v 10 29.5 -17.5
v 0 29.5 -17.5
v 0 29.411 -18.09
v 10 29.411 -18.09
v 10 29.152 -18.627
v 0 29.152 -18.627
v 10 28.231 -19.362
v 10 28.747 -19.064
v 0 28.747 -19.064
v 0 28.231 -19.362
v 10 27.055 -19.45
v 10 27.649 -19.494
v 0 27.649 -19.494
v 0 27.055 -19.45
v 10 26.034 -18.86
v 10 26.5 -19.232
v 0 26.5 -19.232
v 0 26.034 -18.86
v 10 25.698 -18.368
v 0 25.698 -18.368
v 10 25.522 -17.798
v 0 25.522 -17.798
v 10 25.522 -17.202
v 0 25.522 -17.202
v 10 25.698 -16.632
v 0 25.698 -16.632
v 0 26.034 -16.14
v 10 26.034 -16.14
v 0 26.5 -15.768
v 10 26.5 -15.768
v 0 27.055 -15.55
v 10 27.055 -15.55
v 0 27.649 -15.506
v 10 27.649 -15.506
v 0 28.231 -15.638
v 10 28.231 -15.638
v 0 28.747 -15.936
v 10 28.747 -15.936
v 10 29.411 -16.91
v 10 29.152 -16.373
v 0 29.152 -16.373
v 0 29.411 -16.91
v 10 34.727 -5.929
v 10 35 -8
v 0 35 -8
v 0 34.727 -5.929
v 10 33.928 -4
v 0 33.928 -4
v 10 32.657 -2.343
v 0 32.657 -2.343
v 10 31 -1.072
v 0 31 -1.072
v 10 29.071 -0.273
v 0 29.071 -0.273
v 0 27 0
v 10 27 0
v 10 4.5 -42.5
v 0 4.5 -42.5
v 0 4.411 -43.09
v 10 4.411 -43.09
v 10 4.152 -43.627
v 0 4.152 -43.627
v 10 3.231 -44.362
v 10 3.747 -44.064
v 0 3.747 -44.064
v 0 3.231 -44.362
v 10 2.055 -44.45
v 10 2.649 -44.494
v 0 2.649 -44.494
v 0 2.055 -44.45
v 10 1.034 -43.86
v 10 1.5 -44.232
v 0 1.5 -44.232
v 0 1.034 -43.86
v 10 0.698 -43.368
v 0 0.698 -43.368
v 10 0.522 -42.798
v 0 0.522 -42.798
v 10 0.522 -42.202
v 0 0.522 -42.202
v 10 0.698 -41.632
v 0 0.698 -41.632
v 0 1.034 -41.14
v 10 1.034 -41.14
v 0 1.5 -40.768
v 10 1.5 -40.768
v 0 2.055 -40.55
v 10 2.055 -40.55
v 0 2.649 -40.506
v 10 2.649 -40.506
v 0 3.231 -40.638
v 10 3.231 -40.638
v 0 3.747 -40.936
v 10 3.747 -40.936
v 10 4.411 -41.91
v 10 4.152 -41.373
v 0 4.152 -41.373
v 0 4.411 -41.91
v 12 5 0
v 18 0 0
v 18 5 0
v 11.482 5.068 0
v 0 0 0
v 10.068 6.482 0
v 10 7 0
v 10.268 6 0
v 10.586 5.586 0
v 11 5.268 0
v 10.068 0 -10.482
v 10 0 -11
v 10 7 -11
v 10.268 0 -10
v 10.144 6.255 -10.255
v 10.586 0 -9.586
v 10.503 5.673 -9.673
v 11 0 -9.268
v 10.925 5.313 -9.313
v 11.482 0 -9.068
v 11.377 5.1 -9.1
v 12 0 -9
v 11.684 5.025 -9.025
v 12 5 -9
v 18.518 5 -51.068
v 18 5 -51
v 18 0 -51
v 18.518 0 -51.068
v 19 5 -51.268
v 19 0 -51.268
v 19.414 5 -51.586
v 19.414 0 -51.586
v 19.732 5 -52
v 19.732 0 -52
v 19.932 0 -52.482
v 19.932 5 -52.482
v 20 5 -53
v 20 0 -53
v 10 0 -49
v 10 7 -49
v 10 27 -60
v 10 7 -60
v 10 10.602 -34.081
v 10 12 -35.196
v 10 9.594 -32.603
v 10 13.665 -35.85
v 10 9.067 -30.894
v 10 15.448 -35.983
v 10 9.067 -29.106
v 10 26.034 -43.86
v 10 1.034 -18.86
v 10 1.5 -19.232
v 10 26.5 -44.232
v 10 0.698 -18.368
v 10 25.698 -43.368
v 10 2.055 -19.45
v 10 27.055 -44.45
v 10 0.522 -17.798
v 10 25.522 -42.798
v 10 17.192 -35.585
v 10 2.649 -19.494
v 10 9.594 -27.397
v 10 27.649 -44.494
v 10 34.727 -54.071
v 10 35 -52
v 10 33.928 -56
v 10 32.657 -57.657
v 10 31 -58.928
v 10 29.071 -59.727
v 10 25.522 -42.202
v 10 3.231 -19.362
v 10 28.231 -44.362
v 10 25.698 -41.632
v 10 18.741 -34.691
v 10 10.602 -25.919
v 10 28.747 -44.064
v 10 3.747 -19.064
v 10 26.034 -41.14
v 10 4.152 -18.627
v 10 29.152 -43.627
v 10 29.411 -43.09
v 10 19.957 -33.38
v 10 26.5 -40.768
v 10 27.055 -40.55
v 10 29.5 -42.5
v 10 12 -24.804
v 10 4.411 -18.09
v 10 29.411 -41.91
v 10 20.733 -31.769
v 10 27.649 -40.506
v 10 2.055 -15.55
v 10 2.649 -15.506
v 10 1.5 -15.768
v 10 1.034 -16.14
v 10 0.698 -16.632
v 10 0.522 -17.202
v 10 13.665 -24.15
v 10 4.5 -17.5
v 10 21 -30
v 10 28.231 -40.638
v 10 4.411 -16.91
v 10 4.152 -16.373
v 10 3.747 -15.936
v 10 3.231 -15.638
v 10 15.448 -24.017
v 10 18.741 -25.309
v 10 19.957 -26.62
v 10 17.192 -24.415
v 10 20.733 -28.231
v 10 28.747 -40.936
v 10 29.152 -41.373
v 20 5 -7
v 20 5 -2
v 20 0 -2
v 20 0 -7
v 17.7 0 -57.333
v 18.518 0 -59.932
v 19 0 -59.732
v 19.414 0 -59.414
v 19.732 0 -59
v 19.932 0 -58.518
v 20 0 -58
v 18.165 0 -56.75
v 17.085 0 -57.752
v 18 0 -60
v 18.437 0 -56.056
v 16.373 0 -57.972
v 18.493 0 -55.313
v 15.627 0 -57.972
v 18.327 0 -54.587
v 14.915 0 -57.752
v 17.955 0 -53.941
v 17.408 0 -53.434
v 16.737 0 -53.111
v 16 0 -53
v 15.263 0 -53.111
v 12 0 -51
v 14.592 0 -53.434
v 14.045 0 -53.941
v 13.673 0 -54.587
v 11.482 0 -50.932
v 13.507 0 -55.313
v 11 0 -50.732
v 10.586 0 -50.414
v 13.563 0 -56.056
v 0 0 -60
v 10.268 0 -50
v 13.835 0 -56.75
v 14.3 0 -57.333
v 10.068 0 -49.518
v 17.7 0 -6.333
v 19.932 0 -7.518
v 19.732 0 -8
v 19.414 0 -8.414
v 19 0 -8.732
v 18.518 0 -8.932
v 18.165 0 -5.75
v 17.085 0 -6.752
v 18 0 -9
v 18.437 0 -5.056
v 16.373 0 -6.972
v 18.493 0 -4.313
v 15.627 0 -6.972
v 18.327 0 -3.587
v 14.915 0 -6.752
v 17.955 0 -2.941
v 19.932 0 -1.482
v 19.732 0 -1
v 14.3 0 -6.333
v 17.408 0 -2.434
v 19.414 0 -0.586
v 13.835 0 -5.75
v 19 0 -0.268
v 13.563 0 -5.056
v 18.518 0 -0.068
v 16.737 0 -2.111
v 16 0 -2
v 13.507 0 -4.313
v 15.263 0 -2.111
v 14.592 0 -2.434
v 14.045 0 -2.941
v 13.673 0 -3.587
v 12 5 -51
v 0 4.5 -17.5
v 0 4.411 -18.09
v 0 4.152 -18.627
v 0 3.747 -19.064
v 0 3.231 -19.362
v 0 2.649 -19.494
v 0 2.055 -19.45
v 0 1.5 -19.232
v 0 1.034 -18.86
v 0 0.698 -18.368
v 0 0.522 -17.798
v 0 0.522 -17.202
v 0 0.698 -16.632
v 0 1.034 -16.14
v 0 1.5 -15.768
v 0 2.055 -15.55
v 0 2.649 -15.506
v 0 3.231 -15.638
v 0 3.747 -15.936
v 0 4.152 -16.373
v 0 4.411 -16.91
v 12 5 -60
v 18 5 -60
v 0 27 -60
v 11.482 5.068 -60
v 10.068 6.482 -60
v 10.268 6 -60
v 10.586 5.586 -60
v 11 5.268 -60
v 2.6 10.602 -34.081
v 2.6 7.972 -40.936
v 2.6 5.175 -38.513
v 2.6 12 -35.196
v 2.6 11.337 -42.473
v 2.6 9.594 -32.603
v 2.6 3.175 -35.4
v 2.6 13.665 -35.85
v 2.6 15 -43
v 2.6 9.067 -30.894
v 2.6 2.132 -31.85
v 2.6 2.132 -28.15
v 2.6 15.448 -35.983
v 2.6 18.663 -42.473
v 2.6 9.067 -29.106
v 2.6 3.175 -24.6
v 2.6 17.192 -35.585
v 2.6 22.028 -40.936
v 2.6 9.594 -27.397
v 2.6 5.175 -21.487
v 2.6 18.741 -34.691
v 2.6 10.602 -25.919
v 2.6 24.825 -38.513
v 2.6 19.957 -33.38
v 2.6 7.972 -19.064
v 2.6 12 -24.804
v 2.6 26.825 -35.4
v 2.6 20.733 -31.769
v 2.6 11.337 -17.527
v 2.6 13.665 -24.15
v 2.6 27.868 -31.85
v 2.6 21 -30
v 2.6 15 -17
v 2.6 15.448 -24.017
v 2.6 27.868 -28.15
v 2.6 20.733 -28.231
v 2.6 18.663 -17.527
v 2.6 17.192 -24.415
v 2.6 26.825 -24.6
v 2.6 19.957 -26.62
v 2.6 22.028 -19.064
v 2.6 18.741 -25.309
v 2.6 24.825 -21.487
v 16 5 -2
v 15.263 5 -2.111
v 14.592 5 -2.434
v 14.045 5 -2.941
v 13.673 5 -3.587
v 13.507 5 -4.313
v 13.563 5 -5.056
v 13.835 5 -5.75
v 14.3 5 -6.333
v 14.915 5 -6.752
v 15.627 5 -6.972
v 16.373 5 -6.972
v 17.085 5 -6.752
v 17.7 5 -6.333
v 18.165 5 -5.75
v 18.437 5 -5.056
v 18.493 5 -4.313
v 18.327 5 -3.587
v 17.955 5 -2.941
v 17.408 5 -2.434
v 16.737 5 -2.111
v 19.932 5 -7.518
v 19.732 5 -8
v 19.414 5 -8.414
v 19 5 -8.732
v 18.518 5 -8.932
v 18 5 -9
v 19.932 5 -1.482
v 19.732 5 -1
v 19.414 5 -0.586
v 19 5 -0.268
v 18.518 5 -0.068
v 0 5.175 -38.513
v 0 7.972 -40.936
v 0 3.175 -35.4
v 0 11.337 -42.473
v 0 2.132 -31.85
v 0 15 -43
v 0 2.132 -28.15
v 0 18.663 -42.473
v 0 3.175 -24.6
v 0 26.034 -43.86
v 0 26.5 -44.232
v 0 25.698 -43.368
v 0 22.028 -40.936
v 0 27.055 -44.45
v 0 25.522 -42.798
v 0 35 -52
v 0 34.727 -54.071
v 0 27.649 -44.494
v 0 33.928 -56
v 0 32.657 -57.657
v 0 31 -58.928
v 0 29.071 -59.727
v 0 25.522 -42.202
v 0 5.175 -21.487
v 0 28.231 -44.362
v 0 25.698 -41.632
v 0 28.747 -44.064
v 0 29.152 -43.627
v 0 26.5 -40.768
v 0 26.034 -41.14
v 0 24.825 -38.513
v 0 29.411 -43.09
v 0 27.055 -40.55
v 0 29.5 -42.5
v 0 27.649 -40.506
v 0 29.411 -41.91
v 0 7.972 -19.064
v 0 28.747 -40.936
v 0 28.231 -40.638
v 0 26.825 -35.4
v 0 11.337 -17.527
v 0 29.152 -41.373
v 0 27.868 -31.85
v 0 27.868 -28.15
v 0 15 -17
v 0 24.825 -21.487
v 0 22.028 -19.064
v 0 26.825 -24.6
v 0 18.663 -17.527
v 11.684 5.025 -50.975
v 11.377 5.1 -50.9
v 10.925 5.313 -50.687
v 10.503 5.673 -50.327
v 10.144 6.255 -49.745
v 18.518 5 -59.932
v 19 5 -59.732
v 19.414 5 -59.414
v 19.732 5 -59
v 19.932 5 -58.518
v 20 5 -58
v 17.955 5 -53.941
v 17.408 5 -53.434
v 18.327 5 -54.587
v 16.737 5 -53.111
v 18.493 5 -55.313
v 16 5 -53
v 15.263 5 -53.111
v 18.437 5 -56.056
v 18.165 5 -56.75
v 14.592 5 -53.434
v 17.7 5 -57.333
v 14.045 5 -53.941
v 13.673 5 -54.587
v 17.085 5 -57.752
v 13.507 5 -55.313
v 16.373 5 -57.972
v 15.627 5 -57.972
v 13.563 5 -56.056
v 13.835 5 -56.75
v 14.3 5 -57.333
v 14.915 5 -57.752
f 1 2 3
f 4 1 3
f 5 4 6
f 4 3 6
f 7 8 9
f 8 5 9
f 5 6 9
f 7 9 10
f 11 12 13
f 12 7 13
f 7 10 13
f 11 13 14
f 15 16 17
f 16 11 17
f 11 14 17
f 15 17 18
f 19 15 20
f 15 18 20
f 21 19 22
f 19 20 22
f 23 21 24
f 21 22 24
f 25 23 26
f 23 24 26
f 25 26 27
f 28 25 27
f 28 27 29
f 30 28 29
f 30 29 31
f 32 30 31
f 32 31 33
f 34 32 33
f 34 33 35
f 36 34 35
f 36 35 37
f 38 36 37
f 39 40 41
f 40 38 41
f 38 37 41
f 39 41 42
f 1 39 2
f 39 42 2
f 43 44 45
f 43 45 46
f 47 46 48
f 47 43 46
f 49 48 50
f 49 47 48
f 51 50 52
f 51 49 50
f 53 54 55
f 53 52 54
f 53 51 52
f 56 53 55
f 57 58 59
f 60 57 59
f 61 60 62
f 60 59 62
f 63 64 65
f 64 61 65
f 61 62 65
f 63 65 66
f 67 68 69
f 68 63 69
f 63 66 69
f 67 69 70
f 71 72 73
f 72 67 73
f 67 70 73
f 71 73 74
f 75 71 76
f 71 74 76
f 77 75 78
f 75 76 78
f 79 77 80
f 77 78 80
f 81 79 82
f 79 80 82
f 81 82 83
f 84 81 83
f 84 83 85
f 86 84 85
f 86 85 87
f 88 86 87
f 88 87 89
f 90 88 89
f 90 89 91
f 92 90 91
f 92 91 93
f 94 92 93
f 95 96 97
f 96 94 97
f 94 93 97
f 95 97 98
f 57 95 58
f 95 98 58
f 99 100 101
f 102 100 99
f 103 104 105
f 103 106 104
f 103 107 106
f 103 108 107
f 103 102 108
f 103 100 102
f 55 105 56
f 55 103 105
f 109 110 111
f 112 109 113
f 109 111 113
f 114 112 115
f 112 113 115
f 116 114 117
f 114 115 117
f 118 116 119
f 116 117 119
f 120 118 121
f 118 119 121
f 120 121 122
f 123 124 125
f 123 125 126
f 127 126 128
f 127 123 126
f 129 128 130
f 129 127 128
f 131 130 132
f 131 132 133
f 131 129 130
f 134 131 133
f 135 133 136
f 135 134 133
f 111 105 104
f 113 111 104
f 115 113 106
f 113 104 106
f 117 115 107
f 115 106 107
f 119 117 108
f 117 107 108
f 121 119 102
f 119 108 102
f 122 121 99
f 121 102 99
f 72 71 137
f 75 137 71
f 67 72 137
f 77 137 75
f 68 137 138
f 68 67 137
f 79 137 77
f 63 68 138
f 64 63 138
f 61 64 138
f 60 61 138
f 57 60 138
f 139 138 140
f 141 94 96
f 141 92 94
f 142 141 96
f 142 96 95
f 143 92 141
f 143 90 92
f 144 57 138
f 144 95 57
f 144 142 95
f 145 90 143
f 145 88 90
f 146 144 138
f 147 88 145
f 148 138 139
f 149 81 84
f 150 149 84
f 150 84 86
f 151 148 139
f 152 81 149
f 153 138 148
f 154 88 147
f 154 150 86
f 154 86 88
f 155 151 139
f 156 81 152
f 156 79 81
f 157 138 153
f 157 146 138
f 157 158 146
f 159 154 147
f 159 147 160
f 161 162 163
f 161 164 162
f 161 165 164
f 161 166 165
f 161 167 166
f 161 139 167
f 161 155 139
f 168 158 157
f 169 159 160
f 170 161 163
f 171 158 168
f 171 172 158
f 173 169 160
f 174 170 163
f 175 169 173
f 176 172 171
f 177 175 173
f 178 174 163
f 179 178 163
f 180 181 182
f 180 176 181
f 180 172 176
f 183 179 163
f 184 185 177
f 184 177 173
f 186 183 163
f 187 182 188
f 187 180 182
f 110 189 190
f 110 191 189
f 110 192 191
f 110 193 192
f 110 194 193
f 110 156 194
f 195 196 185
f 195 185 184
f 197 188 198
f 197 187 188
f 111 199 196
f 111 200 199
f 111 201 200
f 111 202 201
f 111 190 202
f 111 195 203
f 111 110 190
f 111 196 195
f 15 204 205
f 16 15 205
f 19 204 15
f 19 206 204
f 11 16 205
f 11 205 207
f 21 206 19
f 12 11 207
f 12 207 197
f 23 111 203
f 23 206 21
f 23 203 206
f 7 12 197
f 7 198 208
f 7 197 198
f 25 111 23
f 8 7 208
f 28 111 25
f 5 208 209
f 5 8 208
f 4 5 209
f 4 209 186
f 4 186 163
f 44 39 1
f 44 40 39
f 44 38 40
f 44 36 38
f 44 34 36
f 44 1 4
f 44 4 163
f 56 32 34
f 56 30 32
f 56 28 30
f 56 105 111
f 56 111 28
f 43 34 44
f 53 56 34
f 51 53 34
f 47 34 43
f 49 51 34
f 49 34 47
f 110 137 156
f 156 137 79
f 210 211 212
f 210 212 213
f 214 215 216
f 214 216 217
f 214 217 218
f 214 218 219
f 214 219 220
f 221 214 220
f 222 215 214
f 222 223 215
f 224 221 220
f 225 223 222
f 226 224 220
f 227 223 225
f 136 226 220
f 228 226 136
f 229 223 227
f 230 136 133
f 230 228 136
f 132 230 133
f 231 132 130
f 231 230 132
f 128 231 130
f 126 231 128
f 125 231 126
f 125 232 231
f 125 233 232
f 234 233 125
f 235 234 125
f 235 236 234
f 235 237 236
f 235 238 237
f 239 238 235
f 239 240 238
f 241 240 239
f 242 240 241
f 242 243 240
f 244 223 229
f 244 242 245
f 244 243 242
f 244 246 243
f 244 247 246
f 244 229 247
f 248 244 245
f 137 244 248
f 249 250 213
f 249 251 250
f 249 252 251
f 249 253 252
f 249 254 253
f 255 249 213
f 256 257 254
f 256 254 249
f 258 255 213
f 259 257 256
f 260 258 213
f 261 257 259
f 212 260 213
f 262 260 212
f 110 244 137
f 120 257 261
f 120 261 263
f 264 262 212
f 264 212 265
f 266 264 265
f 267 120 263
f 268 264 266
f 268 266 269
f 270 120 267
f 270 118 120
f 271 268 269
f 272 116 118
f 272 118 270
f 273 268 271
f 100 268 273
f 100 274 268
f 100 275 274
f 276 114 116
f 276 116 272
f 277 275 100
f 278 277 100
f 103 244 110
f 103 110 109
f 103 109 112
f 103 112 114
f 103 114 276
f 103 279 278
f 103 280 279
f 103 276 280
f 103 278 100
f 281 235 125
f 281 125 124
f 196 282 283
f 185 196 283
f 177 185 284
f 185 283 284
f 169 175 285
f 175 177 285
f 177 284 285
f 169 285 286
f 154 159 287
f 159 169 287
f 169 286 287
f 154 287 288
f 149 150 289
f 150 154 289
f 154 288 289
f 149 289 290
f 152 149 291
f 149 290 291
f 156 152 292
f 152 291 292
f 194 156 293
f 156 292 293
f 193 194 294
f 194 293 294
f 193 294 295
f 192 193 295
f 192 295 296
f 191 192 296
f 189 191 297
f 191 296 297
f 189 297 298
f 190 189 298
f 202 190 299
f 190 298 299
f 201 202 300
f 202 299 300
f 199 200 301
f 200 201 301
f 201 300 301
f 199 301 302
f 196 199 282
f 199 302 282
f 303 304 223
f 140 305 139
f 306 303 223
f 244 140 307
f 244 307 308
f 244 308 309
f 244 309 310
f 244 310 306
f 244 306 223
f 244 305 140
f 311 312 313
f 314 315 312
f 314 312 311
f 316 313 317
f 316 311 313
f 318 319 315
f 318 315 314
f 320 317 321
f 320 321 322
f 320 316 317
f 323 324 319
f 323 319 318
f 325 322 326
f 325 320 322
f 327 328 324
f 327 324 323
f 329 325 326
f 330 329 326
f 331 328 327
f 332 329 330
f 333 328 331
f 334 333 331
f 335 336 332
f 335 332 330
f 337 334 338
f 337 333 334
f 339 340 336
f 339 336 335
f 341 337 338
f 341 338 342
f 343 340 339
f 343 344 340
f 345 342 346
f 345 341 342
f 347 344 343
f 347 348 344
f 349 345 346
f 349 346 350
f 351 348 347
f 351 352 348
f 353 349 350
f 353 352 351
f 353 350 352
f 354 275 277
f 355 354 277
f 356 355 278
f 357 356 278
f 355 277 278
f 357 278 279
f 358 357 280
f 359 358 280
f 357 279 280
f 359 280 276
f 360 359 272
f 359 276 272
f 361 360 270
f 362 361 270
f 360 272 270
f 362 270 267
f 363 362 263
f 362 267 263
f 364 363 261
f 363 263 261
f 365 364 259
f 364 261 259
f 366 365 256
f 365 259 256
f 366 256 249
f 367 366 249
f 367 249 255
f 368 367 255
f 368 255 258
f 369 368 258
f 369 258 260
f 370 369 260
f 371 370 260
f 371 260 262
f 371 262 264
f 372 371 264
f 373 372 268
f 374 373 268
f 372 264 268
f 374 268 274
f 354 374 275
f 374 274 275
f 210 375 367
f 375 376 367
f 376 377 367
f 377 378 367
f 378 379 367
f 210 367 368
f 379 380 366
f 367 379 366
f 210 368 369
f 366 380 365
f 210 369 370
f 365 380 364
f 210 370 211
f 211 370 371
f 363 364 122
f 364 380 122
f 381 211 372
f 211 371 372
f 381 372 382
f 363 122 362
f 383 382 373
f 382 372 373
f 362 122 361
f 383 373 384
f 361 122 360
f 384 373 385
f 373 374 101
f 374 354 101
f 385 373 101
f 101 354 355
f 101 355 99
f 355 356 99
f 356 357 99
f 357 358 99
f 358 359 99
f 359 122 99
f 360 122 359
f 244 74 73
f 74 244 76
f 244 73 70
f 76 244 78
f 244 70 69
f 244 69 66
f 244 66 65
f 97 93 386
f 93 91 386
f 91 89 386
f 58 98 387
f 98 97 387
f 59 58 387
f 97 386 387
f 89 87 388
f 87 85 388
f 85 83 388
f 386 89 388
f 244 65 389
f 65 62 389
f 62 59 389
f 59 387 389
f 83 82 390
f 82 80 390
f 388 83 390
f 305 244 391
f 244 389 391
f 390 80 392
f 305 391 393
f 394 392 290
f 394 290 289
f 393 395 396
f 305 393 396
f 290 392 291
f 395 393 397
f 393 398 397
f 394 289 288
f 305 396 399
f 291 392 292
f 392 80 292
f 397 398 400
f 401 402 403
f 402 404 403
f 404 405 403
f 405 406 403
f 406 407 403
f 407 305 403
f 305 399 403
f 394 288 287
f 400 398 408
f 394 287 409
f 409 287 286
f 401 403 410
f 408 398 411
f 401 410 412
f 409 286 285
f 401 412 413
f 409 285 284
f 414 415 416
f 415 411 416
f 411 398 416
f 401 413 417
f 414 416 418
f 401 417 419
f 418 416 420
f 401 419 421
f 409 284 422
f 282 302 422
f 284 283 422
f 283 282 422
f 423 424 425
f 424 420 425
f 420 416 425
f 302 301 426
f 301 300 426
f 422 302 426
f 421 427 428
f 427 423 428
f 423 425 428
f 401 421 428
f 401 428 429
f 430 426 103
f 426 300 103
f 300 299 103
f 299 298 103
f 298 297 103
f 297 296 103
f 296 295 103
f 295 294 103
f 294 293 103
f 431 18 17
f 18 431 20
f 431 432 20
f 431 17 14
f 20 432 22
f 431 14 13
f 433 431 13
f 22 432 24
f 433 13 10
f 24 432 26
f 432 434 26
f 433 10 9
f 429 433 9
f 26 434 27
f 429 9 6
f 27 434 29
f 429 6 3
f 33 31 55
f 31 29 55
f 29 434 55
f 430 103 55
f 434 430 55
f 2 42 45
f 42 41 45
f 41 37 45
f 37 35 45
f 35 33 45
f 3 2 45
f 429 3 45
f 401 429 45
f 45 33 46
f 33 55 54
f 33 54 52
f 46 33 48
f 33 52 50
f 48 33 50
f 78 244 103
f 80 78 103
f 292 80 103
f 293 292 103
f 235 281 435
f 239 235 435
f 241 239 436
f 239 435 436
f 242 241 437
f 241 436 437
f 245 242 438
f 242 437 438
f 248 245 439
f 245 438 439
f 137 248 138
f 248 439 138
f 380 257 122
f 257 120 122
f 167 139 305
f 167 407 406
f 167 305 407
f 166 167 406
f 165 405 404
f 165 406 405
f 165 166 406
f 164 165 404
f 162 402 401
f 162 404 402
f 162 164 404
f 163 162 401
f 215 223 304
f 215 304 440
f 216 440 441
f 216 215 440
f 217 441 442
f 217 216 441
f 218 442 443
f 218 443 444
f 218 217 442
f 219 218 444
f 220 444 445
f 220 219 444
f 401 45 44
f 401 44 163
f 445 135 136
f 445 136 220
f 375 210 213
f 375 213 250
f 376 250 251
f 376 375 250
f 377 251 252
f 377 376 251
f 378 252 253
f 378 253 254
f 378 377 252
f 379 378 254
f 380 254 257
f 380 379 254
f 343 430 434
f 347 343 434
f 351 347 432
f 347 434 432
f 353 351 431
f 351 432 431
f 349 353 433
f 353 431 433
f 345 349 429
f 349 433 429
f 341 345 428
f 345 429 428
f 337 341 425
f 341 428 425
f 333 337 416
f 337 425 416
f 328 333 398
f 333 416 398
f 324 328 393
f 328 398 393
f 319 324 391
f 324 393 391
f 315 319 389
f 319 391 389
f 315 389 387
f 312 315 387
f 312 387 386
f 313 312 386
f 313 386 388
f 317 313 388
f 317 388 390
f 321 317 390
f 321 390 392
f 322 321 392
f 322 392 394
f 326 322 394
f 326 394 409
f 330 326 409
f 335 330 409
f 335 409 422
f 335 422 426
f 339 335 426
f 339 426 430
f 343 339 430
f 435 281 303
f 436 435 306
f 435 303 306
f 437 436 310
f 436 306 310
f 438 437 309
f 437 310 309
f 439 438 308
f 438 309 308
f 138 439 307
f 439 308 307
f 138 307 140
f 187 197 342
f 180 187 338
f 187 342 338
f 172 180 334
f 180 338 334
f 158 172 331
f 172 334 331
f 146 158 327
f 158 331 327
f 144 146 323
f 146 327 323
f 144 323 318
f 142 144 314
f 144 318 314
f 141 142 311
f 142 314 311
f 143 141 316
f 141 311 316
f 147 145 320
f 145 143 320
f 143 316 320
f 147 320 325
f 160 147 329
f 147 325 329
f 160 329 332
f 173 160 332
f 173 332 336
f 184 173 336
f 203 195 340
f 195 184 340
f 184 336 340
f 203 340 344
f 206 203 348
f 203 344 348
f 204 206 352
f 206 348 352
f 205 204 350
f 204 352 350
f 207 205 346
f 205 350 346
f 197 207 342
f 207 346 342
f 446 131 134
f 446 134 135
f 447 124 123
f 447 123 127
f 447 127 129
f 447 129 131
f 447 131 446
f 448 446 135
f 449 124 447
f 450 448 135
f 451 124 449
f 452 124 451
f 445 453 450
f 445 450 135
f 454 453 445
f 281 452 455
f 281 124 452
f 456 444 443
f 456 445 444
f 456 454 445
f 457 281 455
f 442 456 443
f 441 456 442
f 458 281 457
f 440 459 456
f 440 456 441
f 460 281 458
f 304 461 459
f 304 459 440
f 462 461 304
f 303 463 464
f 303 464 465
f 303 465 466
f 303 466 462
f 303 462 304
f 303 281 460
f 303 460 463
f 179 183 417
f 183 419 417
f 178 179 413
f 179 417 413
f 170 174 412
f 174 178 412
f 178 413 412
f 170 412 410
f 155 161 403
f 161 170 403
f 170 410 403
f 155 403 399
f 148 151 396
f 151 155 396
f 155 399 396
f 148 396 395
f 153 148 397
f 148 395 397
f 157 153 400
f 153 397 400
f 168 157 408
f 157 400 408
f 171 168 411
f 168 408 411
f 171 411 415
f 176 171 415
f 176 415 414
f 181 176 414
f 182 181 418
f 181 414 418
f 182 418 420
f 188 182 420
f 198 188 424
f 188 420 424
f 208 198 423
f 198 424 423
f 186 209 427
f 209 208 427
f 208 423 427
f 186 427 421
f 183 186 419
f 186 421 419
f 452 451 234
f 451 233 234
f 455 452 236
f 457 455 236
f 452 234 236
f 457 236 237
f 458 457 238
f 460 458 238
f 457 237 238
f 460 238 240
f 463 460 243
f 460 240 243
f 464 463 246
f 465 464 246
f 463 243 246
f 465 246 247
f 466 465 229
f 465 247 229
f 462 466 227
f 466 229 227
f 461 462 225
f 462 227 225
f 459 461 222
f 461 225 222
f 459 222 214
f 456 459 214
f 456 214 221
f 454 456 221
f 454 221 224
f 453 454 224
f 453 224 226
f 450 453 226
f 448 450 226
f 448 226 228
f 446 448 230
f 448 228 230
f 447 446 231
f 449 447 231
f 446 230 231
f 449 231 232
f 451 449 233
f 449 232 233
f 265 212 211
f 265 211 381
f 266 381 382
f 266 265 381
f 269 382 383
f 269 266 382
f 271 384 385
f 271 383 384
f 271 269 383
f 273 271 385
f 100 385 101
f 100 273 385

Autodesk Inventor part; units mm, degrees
ref_plane "YZ Plane" through (0, 0, 0) normal (1, 0, 0) x (0, 1, 0)
ref_plane "XZ Plane" through (0, 0, 0) normal (0, 1, 0) x (-1, 0, 0)
ref_plane "XY Plane" through (0, 0, 0) normal (0, 0, 1) x (1, 0, 0)
sketch "Boceto1" plane through (0, 0, 0) normal (1, 0, 0) x (0, 1, 0)
  line L0 (0, 0) -> (35, 0)
  line L1 (35, 0) -> (35, -60)
  line L2 (35, -60) -> (0, -60)
  line L3 (0, -60) -> (0, 0)
  circle A0 centre (15, -30) radius 6
  circle A1 centre (27.5, -17.5) radius 2
  circle A2 centre (27.5, -42.5) radius 2
  circle A3 centre (2.5, -42.5) radius 2
  circle A4 centre (2.5, -17.5) radius 2
  dimension "d0" = 60
  dimension "d1" = 35
  dimension "d2" = 20
  dimension "d3" = 30
  dimension "d4" = 12
  dimension "d5" = 12.5
  dimension "d6" = 12.5
  dimension "d7" = 12.5
  dimension "d8" = 12.5
  dimension "d9" = 12.5
  dimension "d10" = 12.5
  dimension "d11" = 12.5
  dimension "d12" = 12.5
  dimension "d13" = 4
  dimension "d14" = 4
  dimension "d15" = 4
  dimension "d16" = 4
extrude "Extrusión1" add sketch "Boceto1" along normal blind 10
sketch "Boceto3" plane through (10, 0, 0) normal (1, 0, 0) x (0, 0, -1)
  circle A0 centre (30, 15) radius 6 projected
  circle A1 centre (30, 15) radius 22
  line L0 (0, 35) -> (0, 0) projected
  line L1 (0, 0) -> (9, 0)
  line L2 (9, 0) -> (9, 5)
  line L3 (9, 5) -> (0, 5)
  line L4 (0, 5) -> (0, 0)
  line L5 (0, 0) -> (60, 0) projected
  line L6 (60, 0) -> (51, 0)
  line L7 (51, 0) -> (51, 5)
  line L8 (51, 5) -> (60, 5)
  line L9 (60, 5) -> (60, 0)
  point P0 (0, 5)
  dimension "d19" = 44
  dimension "d20" = 9
  dimension "d21" = 5
  dimension "d22" = 9
  dimension "d23" = 5
extrude "Extrusión2" add sketch "Boceto3" along normal blind 10 contours L7 L8 L9 L5 | L1 L0 L3 L2
fillet "Empalme1" radius 2 4 edges at (10, 5, -4.5) (10, 5, -55.5) (10, 2.5, -9) (10, 2.5, -51)
sketch "Boceto4" plane through (20, 5, 0) normal (0, 1, 0) x (1, 0, 0)
  line L0 (-8, 9) -> (0, 9) projected
  line L1 (-8, 0) -> (0, 0) projected
  line L2 (-8, 60) -> (0, 60) projected
  line L3 (0, 9) -> (0, 0) projected
  line L4 (0, 60) -> (0, 51) projected
  point P0 (-20, 0)
  point P1 (-4, 4.5)
  point P2 (-4, 55.5)
  dimension "d27" = 4.5
  dimension "d28" = 9
  dimension "d29" = 4.5
  dimension "d30" = 4
  dimension "d31" = 4
hole "Agujero1" at (16, 5, -4.5) at (16, 5, -55.5) direction (0, -1, 0) diameter 5 end through all
fillet "Empalme2" radius 8 2 edges at (5, 35, 0) (5, 35, -60)
sketch "Boceto5" plane through (0, 0, 0) normal (-1, 0, 0) x (0, 0, 1)
  circle A0 centre (-30, 15) radius 6 projected
  circle A1 centre (-30, 15) radius 13
  point P0 (0, 0)
  dimension "d40" = 26
extrude "Extrusión3" cut sketch "Boceto5" against normal blind 2.6
fillet "Empalme3" radius 2 4 edges at (20, 2.5, 0) (20, 2.5, -9) (20, 2.5, -51) (20, 2.5, -60)
equation "\"d3\" = 0.5 * d0"
equation "\"d6\" = d5"
equation "\"d7\" = d5"
equation "\"d8\" = d5"
equation "\"d9\" = d5"
equation "\"d10\" = d5"
equation "\"d11\" = d5"
equation "\"d12\" = d5"
equation "\"d14\" = d13"
equation "\"d15\" = d13"
equation "\"d16\" = d13"
equation "\"d22\" = d20"
equation "\"d27\" = 0.5 * d28"
equation "\"d29\" = d27"
equation "\"d31\" = d30"
properties part number "Soporte_motor_aluminio"
